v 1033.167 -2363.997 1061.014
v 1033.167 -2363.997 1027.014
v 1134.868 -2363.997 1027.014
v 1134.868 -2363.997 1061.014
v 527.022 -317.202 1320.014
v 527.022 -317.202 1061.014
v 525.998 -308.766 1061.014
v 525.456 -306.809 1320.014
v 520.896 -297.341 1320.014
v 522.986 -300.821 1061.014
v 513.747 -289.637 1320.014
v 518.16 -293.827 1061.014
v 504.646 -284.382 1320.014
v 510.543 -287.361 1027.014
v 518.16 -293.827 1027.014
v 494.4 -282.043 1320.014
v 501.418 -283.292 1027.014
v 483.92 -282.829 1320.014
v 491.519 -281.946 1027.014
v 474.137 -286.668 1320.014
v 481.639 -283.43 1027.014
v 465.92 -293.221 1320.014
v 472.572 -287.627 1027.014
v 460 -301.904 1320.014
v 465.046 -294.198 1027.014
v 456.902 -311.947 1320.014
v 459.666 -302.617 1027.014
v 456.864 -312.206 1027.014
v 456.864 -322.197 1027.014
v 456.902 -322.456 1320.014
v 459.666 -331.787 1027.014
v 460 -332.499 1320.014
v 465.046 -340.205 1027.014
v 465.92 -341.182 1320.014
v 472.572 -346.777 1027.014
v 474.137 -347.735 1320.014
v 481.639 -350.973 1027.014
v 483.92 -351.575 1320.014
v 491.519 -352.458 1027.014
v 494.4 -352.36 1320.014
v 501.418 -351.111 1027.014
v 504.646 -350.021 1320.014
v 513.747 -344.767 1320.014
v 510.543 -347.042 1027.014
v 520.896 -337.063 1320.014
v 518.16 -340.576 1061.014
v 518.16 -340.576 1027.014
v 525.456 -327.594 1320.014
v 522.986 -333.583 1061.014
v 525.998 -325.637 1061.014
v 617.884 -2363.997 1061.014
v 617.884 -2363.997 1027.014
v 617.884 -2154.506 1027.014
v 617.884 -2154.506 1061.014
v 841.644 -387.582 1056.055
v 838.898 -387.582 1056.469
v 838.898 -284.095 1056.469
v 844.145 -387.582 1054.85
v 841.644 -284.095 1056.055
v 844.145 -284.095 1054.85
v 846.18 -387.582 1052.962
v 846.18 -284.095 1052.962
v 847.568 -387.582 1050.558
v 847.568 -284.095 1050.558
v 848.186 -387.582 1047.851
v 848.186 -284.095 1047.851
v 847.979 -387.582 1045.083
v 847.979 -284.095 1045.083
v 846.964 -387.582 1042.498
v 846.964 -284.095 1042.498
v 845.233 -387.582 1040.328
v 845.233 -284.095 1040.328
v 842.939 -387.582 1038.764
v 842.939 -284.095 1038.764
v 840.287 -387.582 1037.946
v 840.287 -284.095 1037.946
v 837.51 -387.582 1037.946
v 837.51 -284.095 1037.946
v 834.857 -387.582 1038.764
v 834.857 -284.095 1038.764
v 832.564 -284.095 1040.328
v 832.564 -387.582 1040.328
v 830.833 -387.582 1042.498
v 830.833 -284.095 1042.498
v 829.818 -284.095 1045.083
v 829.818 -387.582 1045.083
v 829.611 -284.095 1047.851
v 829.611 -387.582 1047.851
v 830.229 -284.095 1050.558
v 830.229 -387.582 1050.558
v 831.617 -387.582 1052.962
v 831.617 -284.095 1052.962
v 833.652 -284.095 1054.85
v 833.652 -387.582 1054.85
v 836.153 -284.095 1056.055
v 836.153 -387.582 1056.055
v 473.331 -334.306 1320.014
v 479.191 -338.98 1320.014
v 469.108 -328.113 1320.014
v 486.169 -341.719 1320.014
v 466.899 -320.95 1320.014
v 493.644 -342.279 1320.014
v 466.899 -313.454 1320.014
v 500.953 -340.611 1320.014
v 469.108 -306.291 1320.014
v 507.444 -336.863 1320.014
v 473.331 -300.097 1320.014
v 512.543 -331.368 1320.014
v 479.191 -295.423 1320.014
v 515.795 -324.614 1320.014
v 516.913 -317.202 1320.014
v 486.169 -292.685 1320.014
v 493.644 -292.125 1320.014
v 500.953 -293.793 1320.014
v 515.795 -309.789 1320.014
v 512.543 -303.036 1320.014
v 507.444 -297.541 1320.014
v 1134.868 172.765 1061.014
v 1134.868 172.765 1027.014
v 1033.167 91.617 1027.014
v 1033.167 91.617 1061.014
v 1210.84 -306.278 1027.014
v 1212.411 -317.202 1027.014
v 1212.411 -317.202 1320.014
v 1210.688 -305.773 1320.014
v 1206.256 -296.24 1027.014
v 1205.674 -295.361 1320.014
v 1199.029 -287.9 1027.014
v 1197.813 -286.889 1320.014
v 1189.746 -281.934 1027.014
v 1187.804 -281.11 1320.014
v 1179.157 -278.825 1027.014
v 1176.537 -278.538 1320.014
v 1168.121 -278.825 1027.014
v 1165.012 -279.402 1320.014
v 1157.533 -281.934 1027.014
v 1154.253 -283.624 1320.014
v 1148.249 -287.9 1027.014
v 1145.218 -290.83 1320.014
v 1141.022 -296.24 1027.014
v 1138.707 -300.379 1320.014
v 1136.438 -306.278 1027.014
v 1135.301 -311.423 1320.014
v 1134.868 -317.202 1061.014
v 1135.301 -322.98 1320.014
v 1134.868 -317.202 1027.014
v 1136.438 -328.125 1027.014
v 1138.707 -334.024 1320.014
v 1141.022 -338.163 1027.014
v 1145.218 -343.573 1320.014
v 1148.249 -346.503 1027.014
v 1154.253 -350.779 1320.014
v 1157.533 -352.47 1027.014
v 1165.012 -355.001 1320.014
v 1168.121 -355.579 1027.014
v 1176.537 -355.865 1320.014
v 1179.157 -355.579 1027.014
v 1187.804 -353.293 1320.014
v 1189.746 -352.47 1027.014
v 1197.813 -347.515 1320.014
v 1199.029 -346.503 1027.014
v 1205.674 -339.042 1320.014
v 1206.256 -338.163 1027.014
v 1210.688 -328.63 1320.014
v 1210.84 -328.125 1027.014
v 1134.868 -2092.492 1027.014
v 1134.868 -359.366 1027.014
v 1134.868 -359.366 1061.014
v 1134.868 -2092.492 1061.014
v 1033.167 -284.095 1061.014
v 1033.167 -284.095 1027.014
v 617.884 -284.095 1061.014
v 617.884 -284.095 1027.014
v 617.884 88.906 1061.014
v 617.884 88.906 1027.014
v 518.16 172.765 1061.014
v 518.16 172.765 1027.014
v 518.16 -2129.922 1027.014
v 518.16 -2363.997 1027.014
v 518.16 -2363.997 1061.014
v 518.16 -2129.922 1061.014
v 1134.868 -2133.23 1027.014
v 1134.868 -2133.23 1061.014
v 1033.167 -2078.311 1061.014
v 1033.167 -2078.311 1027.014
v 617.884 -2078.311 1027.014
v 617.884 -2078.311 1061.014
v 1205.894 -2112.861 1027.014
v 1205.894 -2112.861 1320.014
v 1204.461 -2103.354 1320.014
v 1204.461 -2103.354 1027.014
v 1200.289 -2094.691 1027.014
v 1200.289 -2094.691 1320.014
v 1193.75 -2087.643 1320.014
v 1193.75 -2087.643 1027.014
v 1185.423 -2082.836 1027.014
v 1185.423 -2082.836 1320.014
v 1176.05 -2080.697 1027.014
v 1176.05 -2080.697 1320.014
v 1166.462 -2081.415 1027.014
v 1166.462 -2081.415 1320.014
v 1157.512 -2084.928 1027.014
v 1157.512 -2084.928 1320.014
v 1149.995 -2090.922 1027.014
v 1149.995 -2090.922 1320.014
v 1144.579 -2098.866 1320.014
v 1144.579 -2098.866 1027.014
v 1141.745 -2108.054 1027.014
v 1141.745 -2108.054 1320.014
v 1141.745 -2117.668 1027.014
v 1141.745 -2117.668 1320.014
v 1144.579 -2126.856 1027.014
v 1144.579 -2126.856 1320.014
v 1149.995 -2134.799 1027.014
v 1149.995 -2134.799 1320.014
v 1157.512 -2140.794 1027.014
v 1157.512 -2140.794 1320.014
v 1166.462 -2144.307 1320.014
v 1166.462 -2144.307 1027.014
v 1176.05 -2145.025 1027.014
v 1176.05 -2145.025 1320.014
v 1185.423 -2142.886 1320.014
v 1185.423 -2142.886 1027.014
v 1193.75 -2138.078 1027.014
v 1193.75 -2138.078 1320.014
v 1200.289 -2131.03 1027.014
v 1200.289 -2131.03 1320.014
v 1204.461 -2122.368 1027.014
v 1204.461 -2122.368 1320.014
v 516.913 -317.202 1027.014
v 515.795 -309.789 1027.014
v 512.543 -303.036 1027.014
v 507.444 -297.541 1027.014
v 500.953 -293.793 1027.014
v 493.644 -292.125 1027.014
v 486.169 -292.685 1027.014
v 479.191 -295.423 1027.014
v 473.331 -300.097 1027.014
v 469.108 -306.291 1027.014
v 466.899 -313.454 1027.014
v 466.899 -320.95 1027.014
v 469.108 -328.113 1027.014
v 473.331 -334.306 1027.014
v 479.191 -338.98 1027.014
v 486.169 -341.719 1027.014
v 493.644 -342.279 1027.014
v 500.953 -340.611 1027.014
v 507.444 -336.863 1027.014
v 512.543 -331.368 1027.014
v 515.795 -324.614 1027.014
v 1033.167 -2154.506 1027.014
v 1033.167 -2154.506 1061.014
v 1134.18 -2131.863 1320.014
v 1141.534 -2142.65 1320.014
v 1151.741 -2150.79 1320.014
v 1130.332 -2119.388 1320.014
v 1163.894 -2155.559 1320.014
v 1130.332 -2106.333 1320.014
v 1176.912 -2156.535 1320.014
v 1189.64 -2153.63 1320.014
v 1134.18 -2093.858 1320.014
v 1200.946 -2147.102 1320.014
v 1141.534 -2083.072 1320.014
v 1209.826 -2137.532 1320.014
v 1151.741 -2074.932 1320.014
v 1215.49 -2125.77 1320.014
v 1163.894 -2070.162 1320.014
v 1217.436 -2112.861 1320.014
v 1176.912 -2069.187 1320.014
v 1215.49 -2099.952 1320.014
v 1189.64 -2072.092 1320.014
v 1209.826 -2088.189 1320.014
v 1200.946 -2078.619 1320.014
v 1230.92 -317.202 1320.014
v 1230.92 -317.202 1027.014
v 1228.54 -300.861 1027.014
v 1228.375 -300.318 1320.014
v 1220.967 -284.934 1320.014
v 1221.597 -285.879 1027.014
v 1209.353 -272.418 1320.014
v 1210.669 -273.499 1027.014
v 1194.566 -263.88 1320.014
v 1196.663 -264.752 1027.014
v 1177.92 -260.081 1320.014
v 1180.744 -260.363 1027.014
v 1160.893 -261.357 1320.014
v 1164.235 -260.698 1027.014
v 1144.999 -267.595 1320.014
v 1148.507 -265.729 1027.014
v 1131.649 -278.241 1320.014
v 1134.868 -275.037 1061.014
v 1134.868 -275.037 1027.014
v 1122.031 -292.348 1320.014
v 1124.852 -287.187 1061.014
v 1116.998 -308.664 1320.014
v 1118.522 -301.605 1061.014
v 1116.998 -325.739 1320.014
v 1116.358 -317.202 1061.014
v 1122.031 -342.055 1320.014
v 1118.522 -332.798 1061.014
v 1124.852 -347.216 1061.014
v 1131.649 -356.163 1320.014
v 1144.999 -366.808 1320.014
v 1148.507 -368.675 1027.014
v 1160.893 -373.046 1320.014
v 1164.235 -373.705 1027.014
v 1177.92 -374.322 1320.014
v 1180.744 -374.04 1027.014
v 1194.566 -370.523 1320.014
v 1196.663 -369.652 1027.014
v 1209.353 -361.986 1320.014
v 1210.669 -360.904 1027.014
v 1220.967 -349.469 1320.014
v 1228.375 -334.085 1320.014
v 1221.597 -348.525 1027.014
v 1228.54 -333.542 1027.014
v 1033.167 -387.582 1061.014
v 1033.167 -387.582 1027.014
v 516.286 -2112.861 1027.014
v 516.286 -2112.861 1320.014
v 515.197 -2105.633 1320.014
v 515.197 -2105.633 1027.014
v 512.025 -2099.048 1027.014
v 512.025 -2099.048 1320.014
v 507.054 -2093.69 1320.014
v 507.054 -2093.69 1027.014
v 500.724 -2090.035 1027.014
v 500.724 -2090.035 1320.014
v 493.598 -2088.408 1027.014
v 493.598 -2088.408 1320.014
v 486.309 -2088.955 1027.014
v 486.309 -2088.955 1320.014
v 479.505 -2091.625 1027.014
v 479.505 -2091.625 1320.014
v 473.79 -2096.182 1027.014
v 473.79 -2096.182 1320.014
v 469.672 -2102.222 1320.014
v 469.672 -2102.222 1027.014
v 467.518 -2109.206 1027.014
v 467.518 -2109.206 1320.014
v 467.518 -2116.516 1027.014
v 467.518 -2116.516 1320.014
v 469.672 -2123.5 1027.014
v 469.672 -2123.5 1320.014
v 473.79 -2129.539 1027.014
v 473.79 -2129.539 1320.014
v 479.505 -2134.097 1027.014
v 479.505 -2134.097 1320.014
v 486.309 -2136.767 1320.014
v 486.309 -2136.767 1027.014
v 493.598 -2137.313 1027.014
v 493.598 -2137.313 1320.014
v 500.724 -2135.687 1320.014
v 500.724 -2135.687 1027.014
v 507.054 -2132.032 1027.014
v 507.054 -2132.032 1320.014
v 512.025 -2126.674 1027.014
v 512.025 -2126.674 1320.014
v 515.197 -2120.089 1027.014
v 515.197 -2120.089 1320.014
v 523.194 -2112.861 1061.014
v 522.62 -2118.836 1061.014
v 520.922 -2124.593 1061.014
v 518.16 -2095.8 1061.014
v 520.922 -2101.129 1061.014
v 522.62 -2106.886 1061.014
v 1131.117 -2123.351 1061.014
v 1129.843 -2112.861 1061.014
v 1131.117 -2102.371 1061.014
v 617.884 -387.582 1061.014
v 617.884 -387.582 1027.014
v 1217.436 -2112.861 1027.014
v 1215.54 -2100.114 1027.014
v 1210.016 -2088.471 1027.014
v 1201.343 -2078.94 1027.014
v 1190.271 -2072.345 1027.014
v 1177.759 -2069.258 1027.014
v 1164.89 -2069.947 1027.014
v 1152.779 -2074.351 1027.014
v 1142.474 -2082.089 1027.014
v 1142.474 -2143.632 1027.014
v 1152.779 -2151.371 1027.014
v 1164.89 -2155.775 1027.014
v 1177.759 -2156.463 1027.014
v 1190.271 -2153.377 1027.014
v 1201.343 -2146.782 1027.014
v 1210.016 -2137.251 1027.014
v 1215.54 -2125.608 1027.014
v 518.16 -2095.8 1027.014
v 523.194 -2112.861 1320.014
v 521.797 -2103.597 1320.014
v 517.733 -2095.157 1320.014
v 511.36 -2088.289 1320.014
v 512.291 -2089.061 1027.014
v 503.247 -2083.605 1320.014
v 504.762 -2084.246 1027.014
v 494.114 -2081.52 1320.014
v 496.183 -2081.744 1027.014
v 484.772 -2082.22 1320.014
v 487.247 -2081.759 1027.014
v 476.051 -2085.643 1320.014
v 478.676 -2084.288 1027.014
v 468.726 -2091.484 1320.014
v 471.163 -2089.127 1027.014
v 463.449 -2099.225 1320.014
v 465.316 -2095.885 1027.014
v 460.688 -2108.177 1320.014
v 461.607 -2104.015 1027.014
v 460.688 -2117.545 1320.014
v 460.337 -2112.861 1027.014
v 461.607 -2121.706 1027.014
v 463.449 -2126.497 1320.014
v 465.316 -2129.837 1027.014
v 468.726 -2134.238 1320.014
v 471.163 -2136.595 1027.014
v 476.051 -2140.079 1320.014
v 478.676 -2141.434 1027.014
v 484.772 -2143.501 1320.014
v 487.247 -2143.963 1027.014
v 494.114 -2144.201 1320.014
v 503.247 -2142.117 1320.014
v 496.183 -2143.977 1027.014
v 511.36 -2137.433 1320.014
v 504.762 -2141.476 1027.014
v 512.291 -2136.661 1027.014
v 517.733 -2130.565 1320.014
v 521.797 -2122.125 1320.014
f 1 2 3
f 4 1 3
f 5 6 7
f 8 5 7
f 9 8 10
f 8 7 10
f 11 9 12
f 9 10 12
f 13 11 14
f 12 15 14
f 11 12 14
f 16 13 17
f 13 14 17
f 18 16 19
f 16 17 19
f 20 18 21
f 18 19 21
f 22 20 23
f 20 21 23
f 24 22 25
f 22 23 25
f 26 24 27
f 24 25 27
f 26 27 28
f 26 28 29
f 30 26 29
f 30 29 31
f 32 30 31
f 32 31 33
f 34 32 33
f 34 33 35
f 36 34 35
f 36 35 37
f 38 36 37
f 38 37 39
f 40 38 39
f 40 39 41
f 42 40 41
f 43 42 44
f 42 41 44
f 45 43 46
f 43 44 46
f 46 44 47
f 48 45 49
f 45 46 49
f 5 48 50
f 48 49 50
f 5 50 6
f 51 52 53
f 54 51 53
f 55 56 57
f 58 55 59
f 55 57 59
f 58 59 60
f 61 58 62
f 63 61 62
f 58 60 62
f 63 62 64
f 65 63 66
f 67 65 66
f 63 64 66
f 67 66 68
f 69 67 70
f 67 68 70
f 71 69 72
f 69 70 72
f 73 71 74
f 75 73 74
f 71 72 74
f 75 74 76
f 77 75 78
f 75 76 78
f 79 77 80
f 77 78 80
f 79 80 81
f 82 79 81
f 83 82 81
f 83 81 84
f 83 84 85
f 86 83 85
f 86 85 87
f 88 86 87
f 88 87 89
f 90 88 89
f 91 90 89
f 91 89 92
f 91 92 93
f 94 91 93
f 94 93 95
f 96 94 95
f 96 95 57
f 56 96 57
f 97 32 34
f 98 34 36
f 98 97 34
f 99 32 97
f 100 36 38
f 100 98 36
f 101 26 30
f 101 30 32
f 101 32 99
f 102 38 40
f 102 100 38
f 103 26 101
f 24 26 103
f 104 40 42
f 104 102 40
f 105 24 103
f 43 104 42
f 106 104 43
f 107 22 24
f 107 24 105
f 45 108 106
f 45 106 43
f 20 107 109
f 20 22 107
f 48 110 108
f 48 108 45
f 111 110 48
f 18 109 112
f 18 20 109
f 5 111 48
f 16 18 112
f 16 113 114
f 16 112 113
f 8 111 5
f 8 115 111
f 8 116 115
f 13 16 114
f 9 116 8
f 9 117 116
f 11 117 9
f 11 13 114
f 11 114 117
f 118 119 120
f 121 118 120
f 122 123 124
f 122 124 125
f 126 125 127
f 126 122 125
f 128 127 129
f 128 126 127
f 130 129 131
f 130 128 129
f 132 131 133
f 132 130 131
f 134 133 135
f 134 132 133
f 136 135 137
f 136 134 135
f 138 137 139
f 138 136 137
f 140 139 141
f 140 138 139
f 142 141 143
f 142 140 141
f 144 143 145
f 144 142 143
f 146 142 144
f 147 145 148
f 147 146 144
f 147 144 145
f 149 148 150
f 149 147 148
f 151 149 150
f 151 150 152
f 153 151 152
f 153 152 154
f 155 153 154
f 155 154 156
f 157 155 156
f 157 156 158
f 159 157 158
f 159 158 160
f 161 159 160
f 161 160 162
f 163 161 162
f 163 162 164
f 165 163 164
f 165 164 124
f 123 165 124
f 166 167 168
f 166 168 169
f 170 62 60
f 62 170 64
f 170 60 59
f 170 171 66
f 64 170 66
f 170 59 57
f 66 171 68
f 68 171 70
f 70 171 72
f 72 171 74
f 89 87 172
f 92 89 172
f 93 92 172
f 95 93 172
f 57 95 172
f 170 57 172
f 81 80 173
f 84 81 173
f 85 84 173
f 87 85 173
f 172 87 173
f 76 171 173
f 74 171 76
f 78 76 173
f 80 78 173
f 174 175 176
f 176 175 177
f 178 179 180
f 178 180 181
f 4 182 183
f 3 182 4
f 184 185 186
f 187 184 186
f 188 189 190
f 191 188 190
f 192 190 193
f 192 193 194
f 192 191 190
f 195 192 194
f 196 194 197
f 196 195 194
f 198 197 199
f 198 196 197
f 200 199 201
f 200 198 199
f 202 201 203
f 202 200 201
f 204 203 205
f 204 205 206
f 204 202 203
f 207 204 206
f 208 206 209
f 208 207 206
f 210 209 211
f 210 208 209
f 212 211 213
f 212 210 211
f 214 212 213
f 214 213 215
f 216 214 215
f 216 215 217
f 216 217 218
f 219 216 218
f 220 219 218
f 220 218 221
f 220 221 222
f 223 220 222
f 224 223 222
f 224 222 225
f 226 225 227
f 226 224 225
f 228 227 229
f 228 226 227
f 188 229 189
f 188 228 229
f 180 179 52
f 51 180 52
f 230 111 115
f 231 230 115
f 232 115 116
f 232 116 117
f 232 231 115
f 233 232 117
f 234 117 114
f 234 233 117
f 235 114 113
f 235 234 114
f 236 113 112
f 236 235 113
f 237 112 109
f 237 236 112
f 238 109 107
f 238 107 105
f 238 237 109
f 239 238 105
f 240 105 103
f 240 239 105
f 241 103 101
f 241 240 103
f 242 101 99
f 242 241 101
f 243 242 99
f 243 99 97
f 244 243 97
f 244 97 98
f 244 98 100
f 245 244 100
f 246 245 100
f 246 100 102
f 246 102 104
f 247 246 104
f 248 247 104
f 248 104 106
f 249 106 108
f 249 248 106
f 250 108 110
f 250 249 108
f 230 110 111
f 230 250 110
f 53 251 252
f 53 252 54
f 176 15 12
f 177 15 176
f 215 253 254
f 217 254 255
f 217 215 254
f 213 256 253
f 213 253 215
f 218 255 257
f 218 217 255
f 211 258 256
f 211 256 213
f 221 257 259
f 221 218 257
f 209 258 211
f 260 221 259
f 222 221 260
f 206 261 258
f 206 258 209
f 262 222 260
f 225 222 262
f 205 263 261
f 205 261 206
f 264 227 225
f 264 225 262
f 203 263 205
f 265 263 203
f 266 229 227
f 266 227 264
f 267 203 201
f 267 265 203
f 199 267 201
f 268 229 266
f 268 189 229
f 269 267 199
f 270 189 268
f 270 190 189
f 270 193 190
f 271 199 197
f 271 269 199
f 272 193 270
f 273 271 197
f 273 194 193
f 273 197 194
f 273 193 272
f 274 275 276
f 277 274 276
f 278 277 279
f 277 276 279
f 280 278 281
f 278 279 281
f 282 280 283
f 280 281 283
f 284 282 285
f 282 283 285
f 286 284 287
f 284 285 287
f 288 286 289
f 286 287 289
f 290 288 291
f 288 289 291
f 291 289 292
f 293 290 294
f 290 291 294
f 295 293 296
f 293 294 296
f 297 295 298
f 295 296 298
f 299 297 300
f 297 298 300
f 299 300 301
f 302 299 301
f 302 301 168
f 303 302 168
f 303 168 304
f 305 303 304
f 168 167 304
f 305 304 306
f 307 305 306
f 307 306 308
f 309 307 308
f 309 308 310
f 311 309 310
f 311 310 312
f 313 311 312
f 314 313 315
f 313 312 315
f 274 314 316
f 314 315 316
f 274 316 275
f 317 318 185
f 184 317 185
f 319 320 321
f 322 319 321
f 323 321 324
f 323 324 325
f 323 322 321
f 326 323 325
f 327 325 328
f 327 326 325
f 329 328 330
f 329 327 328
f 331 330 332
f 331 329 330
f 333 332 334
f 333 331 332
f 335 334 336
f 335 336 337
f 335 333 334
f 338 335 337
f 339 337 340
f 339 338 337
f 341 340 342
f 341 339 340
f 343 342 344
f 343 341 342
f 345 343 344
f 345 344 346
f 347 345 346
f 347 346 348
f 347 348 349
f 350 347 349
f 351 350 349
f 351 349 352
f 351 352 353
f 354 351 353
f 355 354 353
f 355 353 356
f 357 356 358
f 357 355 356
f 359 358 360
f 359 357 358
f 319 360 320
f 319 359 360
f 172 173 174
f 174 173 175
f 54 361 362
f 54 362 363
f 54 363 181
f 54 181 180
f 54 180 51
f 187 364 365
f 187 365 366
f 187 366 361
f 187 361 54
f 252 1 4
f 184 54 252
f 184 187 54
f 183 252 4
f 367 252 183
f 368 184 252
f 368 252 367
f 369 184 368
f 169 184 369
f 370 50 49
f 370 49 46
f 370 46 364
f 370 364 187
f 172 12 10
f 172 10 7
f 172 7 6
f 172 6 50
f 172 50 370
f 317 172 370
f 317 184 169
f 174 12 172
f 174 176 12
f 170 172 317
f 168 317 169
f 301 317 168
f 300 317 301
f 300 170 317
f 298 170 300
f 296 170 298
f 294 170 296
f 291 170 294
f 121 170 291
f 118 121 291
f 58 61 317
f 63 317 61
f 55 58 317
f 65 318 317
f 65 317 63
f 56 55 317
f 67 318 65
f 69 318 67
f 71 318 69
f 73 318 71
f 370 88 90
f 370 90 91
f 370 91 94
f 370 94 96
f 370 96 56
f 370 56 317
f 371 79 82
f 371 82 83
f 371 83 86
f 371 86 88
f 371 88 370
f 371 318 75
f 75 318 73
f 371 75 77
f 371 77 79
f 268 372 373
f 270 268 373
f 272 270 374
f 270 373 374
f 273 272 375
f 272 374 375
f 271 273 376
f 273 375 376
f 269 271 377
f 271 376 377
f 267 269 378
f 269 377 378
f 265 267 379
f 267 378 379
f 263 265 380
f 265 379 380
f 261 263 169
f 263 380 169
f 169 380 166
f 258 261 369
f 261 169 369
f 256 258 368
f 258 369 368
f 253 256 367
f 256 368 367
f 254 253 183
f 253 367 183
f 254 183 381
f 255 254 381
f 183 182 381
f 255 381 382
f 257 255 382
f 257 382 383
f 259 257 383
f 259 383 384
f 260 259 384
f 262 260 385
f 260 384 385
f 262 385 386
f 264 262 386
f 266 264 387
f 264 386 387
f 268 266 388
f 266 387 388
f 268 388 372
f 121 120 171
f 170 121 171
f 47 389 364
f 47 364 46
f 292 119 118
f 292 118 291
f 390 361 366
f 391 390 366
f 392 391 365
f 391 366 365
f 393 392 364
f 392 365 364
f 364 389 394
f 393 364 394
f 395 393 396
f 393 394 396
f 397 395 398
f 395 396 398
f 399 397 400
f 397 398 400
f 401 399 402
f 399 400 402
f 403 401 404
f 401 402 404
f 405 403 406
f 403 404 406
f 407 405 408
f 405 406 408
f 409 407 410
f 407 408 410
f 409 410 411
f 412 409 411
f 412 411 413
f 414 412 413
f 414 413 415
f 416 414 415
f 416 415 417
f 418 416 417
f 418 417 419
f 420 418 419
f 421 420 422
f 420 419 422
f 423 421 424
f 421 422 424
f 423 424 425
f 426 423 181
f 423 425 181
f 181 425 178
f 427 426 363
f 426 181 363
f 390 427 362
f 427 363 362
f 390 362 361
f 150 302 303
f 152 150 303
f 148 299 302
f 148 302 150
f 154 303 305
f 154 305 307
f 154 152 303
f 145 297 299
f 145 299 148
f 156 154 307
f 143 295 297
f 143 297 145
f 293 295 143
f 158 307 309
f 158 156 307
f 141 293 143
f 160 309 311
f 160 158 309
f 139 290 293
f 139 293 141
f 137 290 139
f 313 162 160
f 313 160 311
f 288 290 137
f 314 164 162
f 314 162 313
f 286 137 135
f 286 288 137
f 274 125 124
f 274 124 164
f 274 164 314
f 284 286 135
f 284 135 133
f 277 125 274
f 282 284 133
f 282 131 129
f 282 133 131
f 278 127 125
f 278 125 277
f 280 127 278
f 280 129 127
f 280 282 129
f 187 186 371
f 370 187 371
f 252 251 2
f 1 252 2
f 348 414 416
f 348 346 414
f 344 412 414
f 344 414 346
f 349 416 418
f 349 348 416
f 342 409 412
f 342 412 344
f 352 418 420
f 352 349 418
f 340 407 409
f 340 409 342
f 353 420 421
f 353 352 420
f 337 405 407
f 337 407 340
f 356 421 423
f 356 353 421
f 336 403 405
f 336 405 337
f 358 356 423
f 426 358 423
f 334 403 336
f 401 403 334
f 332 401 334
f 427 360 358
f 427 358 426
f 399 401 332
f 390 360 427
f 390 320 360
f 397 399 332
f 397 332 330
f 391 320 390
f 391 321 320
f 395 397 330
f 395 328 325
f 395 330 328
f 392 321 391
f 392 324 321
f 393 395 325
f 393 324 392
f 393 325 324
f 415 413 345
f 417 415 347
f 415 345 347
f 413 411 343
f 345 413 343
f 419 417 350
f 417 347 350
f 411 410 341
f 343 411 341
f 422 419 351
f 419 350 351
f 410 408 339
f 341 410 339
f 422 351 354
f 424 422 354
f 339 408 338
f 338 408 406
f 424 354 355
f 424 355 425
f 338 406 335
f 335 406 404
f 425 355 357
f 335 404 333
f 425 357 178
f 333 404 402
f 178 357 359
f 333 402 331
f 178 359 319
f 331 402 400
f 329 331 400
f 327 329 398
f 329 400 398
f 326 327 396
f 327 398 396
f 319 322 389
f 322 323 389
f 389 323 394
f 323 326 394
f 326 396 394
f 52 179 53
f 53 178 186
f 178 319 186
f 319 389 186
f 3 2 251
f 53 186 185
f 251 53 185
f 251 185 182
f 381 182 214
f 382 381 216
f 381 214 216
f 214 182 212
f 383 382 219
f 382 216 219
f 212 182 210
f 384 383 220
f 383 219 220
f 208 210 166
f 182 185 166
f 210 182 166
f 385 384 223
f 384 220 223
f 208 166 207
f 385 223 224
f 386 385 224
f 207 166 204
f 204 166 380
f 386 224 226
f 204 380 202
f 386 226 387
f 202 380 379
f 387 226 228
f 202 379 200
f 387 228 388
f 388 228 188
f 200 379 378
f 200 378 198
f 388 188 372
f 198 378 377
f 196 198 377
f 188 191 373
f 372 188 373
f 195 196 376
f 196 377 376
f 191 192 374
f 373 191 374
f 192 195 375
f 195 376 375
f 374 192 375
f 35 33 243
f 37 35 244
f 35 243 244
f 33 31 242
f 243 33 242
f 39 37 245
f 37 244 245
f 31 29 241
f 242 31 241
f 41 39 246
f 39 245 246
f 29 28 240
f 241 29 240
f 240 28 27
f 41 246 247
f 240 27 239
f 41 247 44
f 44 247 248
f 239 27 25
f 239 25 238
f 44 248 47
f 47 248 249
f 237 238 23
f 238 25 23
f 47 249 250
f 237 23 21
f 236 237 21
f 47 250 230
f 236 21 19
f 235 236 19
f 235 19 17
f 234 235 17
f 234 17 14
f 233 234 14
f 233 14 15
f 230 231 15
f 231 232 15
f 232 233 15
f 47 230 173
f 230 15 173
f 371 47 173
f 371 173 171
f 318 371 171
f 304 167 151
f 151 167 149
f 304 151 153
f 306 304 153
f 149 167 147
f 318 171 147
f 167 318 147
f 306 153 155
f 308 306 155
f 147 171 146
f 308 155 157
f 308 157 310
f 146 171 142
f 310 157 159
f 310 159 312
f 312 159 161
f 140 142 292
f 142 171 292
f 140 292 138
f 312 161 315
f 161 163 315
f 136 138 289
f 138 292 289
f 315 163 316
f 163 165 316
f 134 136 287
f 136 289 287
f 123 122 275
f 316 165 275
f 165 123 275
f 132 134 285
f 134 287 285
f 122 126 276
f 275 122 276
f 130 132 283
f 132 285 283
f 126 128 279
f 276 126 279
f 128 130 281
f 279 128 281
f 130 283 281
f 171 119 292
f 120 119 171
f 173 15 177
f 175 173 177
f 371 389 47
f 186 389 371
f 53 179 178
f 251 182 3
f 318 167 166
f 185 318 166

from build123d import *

# Parameters (mm, degrees)
BOSS_EXTRUDE1_START   = 600
SKETCH1_R             = 57.281017464
SKETCH1_R_2           = 38.771715285
BOSS_EXTRUDE1_DEPTH   = 293
SKETCH1_R_3           = 35.256926628
SKETCH1_R_4           = 25.147423748
BOSS_EXTRUDE1_2_DEPTH = 293
SKETCH1_R_5           = 31.428515318
SKETCH1_R_6           = 24.521075722
BOSS_EXTRUDE1_3_DEPTH = 293
SKETCH1_R_7           = 43.796557911
SKETCH1_R_8           = 32.254492843
BOSS_EXTRUDE1_4_DEPTH = 293
SKETCH2_W             = 616.707969139
SKETCH2_H             = 76.195303947
SKETCH2_H_2           = 103.48726304
BOSS_EXTRUDE2_DEPTH   = 34
SKETCH6_R             = 9.313662058
CUT_EXTRUDE3_DEPTH    = 126


with BuildPart() as part:
    # Sketch1 → Boss-Extrude1 (new body)
    with BuildSketch(Plane.XY.offset(427.014108562).offset(BOSS_EXTRUDE1_START)):
        with Locations((1173.639225527, -317.201613393)):
            Circle(SKETCH1_R)
        with Locations((1173.639225527, -317.201613393)):
            Circle(SKETCH1_R_2, mode=Mode.SUBTRACT)
    extrude(amount=BOSS_EXTRUDE1_DEPTH)



with BuildPart() as body_2:
    # Sketch1 → Boss-Extrude1 2 (new body)
    with BuildSketch(Plane.XY.offset(427.014108562).offset(BOSS_EXTRUDE1_START)):
        with Locations((491.765116758, -317.201613393)):
            Circle(SKETCH1_R_3)
        with Locations((491.765116758, -317.201613393)):
            Circle(SKETCH1_R_4, mode=Mode.SUBTRACT)
    extrude(amount=BOSS_EXTRUDE1_2_DEPTH)


with BuildPart() as body_3:
    # Sketch1 → Boss-Extrude1 3 (new body)
    with BuildSketch(Plane.XY.offset(427.014108562).offset(BOSS_EXTRUDE1_START)):
        with Locations((491.765116758, -2112.860849235)):
            Circle(SKETCH1_R_5)
        with Locations((491.765116758, -2112.860849235)):
            Circle(SKETCH1_R_6, mode=Mode.SUBTRACT)
    extrude(amount=BOSS_EXTRUDE1_3_DEPTH)


with BuildPart() as body_4:
    # Sketch1 → Boss-Extrude1 4 (new body)
    with BuildSketch(Plane.XY.offset(427.014108562).offset(BOSS_EXTRUDE1_START)):
        with Locations((1173.639225527, -2112.860849235)):
            Circle(SKETCH1_R_7)
        with Locations((1173.639225527, -2112.860849235)):
            Circle(SKETCH1_R_8, mode=Mode.SUBTRACT)
    extrude(amount=BOSS_EXTRUDE1_4_DEPTH)


with BuildPart() as part_1:
    add(part.part)

    add(body_2.part)  # Boss-Extrude2 merges body 2

    add(body_3.part)  # Boss-Extrude2 merges body 3

    add(body_4.part)  # Boss-Extrude2 merges body 4
    # Sketch2 → Boss-Extrude2 (add)
    with BuildSketch(Plane(origin=(0, 0, 1027.014108562), x_dir=(-1, 0, 0), z_dir=(0, 0, -1))):
        Polygon((-1134.867510242, 91.617150216), (-1134.867510242, 172.765208514), (-1033.166693927, 91.617150216), (-1033.166693927, -2363.997444221), (-1134.867510242, -2363.997444221), align=None)
        Polygon((-518.159541103, -2363.997444221), (-617.883714932, -2363.997444221), (-617.883714932, 88.905828795), (-518.159541103, 172.765208514), (-518.159541103, 88.905828795), align=None)
        with Locations((-826.513525673, -2116.408610896)):
            Rectangle(SKETCH2_W, SKETCH2_H)
        with Locations((-826.513525673, -335.838828239)):
            Rectangle(SKETCH2_W, SKETCH2_H_2)
    extrude(amount=-BOSS_EXTRUDE2_DEPTH)

    # Sketch6 → Cut-Extrude3 (cut)
    with BuildSketch(Plane(origin=(0, -284.095196719, 0), x_dir=(1, 0, 0), z_dir=(0, 1, 0))):
        with Locations(Location((838.898443774, -1047.155157013, 0), (0, 0, 270))):
            Circle(SKETCH6_R)
    extrude(amount=-CUT_EXTRUDE3_DEPTH, mode=Mode.SUBTRACT)


solid = part_1.part
